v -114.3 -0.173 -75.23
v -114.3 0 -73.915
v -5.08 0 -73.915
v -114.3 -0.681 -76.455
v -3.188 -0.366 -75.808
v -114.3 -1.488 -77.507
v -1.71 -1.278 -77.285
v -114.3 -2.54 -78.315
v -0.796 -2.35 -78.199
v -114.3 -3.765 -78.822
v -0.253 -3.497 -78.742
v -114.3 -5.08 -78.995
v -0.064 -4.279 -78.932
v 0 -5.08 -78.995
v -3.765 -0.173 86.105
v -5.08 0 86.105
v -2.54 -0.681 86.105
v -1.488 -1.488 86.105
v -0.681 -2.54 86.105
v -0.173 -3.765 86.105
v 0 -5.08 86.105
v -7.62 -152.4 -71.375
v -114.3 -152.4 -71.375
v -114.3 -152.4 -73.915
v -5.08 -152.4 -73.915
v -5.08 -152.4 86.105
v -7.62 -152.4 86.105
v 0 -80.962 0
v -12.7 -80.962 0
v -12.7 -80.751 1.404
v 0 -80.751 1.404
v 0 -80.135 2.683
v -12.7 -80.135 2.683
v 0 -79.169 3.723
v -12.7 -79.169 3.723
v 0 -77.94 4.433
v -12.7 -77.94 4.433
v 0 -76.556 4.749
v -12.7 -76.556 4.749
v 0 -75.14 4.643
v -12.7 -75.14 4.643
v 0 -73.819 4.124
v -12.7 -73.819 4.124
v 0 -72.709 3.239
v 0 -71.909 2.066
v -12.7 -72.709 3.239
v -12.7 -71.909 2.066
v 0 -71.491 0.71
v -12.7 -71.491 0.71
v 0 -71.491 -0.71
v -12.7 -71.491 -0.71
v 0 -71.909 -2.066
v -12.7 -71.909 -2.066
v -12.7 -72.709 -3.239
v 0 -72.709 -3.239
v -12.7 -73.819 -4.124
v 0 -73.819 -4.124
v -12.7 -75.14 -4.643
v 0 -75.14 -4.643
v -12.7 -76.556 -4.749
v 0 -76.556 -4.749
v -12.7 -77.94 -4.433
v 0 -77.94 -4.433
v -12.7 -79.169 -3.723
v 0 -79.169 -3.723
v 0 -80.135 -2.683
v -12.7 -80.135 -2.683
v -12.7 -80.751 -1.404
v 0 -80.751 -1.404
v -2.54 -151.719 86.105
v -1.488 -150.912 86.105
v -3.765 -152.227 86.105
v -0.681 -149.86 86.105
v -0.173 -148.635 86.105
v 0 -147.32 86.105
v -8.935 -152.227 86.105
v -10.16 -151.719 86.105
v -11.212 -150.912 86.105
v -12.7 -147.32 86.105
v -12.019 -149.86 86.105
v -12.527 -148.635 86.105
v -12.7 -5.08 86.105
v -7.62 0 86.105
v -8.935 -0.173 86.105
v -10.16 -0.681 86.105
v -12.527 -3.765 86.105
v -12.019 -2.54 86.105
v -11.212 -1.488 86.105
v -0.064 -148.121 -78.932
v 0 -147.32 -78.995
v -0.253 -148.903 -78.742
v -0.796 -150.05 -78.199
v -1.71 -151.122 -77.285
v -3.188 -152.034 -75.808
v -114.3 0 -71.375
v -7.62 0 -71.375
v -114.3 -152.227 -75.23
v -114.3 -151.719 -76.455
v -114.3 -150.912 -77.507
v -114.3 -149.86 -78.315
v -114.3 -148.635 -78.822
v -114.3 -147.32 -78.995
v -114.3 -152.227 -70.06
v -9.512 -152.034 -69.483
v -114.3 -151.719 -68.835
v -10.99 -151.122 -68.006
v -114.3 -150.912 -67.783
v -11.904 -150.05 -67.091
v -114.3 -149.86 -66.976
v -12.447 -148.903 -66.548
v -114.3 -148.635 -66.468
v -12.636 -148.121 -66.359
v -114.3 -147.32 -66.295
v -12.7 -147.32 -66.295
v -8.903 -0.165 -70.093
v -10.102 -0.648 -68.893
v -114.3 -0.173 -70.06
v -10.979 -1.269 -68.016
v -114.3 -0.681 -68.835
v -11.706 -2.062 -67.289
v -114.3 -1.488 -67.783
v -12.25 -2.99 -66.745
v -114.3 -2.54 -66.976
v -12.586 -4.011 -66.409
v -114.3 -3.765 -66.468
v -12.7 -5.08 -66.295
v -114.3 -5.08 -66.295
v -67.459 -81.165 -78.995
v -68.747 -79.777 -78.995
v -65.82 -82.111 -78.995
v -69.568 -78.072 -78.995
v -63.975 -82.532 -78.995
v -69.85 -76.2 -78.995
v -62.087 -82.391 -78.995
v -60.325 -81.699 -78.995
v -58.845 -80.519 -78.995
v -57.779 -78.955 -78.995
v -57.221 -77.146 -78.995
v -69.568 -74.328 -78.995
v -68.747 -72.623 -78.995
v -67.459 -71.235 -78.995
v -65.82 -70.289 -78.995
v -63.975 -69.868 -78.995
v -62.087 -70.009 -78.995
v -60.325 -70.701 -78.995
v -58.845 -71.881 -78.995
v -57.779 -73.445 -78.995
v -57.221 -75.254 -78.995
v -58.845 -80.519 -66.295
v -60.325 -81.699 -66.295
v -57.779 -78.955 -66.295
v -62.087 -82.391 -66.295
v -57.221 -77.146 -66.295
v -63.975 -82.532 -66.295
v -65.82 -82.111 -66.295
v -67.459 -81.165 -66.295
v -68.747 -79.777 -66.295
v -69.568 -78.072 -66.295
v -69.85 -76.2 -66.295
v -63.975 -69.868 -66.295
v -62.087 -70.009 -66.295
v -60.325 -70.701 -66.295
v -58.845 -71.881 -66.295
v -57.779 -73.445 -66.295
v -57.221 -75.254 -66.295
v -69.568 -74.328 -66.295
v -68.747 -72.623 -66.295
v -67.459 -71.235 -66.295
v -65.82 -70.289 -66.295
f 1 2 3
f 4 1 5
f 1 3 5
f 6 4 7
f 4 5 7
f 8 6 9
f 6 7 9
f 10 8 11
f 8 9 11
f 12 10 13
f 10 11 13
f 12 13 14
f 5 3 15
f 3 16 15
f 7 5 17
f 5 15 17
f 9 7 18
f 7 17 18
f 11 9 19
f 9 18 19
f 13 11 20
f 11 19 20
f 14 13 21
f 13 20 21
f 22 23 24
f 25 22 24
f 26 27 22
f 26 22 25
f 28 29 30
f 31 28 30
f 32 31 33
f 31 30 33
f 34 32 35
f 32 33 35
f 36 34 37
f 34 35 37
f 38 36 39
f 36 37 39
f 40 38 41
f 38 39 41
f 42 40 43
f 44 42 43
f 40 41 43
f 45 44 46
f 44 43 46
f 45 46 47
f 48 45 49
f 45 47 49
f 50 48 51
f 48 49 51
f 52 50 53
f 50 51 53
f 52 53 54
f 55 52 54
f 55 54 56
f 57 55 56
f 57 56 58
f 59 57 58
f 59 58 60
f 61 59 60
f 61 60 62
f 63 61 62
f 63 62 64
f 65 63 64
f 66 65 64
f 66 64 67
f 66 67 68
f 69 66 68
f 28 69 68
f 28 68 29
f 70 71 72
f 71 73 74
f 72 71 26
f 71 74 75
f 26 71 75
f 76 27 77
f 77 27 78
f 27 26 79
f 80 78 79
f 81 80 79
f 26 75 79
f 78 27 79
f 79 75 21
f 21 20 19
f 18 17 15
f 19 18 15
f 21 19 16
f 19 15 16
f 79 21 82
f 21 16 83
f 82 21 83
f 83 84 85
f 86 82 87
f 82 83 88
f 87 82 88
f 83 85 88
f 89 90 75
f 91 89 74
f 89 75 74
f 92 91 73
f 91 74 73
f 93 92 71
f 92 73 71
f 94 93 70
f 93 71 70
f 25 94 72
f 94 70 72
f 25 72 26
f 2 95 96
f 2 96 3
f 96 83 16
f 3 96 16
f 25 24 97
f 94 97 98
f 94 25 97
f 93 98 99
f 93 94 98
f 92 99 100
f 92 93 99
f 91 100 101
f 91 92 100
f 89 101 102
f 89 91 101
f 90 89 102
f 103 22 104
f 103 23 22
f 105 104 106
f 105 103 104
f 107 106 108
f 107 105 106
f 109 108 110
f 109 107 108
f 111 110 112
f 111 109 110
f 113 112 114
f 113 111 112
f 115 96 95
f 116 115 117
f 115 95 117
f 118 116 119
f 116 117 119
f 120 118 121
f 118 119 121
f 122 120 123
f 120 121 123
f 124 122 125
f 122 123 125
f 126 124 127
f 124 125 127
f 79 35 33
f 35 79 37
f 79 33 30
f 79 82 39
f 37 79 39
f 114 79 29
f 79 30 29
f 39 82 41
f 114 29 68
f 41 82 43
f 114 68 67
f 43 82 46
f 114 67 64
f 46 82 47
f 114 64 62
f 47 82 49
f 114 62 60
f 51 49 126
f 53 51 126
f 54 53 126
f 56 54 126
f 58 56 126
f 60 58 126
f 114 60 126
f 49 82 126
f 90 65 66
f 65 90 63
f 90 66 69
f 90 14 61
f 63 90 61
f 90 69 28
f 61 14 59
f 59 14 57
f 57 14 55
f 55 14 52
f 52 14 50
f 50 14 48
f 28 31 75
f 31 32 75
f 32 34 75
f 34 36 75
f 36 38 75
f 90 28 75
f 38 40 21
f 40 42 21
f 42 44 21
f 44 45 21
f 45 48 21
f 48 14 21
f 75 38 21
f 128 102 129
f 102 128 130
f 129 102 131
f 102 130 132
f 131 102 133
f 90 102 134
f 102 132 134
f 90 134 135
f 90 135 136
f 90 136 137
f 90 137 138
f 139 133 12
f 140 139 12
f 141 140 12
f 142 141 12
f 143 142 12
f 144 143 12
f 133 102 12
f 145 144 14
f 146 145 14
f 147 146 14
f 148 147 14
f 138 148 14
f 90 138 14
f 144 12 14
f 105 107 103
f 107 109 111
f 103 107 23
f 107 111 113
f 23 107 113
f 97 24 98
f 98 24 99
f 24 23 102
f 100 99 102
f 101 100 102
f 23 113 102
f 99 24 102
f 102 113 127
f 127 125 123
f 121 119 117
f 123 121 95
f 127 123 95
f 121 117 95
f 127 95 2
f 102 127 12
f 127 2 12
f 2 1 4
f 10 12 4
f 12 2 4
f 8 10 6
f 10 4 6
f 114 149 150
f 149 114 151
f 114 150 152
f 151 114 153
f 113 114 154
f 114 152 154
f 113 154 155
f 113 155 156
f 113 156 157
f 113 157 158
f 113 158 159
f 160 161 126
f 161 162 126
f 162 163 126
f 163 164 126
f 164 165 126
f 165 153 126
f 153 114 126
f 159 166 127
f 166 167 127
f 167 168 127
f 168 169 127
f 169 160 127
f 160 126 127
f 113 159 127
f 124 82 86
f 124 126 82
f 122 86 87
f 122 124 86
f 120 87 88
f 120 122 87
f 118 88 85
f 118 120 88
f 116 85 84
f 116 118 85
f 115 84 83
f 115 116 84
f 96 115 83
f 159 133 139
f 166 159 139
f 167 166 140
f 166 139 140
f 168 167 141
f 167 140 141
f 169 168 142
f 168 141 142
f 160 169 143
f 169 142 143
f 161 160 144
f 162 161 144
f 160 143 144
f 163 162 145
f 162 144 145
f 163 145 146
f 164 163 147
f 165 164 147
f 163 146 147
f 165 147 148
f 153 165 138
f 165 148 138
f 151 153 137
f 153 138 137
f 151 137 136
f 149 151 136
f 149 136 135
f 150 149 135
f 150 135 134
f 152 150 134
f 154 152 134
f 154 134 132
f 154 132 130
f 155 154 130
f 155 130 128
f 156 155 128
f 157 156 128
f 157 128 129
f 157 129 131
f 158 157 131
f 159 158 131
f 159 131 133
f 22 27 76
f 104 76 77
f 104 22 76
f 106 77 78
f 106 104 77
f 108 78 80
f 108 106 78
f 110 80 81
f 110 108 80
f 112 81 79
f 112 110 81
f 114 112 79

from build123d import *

# Parameters (mm, degrees)
F1_DEPTH = 152.4
F3_D     = 9.525
F5_D     = 12.7
F6_R     = 5.08
F7_R     = 5.08
F8_R     = 5.08
F9_R     = 5.08


# Not quite as in the source:
# - a length typed as a fraction of an inch, garbled in the dataset ("3 / 203.2 mm" for 3/8 in), is restored


with BuildPart() as f1:
    # F0 (on Front) → F1 (new body)
    with BuildSketch(Plane.XZ):
        Polygon((0, -78.9952108244), (0, 86.1047891756), (-12.7, 86.1047891756), (-12.7, -66.2952108244), (-114.3, -66.2952108244), (-114.3, -78.9952108244), align=None)
    extrude(amount=F1_DEPTH)

    # F3 (through all)
    with Locations(Plane.YZ):
        with Locations((-76.2, 0)):
            Hole(F3_D / 2)

    # F5 (through all)
    with Locations(Plane.XY.offset(-66.2952108244)):
        with Locations((-63.5, -76.2)):
            Hole(F5_D / 2)

    # F6
    f6_edges = [f1.edges().sort_by_distance(p)[0] for p in [
        (-12.7, -152.4, 9.904789),
        (-63.5, -152.4, -66.295211),
    ]]
    fillet(f6_edges, radius=F6_R)

    # F7
    f7_edges = [f1.edges().sort_by_distance(p)[0] for p in [
        (-12.7, 0, 9.904789),
        (-63.5, 0, -66.295211),
    ]]
    fillet(f7_edges, radius=F7_R)

    # F8
    f8_edges = [f1.edges().sort_by_distance(p)[0] for p in [
        (-57.15, 0, -78.995211),
        (0, 0, 3.554789),
    ]]
    fillet(f8_edges, radius=F8_R)

    # F9
    f9_edges = [f1.edges().sort_by_distance(p)[0] for p in [
        (-57.15, -152.4, -78.995211),
        (0, -152.4, 3.554789),
    ]]
    fillet(f9_edges, radius=F9_R)


solid = f1.part
